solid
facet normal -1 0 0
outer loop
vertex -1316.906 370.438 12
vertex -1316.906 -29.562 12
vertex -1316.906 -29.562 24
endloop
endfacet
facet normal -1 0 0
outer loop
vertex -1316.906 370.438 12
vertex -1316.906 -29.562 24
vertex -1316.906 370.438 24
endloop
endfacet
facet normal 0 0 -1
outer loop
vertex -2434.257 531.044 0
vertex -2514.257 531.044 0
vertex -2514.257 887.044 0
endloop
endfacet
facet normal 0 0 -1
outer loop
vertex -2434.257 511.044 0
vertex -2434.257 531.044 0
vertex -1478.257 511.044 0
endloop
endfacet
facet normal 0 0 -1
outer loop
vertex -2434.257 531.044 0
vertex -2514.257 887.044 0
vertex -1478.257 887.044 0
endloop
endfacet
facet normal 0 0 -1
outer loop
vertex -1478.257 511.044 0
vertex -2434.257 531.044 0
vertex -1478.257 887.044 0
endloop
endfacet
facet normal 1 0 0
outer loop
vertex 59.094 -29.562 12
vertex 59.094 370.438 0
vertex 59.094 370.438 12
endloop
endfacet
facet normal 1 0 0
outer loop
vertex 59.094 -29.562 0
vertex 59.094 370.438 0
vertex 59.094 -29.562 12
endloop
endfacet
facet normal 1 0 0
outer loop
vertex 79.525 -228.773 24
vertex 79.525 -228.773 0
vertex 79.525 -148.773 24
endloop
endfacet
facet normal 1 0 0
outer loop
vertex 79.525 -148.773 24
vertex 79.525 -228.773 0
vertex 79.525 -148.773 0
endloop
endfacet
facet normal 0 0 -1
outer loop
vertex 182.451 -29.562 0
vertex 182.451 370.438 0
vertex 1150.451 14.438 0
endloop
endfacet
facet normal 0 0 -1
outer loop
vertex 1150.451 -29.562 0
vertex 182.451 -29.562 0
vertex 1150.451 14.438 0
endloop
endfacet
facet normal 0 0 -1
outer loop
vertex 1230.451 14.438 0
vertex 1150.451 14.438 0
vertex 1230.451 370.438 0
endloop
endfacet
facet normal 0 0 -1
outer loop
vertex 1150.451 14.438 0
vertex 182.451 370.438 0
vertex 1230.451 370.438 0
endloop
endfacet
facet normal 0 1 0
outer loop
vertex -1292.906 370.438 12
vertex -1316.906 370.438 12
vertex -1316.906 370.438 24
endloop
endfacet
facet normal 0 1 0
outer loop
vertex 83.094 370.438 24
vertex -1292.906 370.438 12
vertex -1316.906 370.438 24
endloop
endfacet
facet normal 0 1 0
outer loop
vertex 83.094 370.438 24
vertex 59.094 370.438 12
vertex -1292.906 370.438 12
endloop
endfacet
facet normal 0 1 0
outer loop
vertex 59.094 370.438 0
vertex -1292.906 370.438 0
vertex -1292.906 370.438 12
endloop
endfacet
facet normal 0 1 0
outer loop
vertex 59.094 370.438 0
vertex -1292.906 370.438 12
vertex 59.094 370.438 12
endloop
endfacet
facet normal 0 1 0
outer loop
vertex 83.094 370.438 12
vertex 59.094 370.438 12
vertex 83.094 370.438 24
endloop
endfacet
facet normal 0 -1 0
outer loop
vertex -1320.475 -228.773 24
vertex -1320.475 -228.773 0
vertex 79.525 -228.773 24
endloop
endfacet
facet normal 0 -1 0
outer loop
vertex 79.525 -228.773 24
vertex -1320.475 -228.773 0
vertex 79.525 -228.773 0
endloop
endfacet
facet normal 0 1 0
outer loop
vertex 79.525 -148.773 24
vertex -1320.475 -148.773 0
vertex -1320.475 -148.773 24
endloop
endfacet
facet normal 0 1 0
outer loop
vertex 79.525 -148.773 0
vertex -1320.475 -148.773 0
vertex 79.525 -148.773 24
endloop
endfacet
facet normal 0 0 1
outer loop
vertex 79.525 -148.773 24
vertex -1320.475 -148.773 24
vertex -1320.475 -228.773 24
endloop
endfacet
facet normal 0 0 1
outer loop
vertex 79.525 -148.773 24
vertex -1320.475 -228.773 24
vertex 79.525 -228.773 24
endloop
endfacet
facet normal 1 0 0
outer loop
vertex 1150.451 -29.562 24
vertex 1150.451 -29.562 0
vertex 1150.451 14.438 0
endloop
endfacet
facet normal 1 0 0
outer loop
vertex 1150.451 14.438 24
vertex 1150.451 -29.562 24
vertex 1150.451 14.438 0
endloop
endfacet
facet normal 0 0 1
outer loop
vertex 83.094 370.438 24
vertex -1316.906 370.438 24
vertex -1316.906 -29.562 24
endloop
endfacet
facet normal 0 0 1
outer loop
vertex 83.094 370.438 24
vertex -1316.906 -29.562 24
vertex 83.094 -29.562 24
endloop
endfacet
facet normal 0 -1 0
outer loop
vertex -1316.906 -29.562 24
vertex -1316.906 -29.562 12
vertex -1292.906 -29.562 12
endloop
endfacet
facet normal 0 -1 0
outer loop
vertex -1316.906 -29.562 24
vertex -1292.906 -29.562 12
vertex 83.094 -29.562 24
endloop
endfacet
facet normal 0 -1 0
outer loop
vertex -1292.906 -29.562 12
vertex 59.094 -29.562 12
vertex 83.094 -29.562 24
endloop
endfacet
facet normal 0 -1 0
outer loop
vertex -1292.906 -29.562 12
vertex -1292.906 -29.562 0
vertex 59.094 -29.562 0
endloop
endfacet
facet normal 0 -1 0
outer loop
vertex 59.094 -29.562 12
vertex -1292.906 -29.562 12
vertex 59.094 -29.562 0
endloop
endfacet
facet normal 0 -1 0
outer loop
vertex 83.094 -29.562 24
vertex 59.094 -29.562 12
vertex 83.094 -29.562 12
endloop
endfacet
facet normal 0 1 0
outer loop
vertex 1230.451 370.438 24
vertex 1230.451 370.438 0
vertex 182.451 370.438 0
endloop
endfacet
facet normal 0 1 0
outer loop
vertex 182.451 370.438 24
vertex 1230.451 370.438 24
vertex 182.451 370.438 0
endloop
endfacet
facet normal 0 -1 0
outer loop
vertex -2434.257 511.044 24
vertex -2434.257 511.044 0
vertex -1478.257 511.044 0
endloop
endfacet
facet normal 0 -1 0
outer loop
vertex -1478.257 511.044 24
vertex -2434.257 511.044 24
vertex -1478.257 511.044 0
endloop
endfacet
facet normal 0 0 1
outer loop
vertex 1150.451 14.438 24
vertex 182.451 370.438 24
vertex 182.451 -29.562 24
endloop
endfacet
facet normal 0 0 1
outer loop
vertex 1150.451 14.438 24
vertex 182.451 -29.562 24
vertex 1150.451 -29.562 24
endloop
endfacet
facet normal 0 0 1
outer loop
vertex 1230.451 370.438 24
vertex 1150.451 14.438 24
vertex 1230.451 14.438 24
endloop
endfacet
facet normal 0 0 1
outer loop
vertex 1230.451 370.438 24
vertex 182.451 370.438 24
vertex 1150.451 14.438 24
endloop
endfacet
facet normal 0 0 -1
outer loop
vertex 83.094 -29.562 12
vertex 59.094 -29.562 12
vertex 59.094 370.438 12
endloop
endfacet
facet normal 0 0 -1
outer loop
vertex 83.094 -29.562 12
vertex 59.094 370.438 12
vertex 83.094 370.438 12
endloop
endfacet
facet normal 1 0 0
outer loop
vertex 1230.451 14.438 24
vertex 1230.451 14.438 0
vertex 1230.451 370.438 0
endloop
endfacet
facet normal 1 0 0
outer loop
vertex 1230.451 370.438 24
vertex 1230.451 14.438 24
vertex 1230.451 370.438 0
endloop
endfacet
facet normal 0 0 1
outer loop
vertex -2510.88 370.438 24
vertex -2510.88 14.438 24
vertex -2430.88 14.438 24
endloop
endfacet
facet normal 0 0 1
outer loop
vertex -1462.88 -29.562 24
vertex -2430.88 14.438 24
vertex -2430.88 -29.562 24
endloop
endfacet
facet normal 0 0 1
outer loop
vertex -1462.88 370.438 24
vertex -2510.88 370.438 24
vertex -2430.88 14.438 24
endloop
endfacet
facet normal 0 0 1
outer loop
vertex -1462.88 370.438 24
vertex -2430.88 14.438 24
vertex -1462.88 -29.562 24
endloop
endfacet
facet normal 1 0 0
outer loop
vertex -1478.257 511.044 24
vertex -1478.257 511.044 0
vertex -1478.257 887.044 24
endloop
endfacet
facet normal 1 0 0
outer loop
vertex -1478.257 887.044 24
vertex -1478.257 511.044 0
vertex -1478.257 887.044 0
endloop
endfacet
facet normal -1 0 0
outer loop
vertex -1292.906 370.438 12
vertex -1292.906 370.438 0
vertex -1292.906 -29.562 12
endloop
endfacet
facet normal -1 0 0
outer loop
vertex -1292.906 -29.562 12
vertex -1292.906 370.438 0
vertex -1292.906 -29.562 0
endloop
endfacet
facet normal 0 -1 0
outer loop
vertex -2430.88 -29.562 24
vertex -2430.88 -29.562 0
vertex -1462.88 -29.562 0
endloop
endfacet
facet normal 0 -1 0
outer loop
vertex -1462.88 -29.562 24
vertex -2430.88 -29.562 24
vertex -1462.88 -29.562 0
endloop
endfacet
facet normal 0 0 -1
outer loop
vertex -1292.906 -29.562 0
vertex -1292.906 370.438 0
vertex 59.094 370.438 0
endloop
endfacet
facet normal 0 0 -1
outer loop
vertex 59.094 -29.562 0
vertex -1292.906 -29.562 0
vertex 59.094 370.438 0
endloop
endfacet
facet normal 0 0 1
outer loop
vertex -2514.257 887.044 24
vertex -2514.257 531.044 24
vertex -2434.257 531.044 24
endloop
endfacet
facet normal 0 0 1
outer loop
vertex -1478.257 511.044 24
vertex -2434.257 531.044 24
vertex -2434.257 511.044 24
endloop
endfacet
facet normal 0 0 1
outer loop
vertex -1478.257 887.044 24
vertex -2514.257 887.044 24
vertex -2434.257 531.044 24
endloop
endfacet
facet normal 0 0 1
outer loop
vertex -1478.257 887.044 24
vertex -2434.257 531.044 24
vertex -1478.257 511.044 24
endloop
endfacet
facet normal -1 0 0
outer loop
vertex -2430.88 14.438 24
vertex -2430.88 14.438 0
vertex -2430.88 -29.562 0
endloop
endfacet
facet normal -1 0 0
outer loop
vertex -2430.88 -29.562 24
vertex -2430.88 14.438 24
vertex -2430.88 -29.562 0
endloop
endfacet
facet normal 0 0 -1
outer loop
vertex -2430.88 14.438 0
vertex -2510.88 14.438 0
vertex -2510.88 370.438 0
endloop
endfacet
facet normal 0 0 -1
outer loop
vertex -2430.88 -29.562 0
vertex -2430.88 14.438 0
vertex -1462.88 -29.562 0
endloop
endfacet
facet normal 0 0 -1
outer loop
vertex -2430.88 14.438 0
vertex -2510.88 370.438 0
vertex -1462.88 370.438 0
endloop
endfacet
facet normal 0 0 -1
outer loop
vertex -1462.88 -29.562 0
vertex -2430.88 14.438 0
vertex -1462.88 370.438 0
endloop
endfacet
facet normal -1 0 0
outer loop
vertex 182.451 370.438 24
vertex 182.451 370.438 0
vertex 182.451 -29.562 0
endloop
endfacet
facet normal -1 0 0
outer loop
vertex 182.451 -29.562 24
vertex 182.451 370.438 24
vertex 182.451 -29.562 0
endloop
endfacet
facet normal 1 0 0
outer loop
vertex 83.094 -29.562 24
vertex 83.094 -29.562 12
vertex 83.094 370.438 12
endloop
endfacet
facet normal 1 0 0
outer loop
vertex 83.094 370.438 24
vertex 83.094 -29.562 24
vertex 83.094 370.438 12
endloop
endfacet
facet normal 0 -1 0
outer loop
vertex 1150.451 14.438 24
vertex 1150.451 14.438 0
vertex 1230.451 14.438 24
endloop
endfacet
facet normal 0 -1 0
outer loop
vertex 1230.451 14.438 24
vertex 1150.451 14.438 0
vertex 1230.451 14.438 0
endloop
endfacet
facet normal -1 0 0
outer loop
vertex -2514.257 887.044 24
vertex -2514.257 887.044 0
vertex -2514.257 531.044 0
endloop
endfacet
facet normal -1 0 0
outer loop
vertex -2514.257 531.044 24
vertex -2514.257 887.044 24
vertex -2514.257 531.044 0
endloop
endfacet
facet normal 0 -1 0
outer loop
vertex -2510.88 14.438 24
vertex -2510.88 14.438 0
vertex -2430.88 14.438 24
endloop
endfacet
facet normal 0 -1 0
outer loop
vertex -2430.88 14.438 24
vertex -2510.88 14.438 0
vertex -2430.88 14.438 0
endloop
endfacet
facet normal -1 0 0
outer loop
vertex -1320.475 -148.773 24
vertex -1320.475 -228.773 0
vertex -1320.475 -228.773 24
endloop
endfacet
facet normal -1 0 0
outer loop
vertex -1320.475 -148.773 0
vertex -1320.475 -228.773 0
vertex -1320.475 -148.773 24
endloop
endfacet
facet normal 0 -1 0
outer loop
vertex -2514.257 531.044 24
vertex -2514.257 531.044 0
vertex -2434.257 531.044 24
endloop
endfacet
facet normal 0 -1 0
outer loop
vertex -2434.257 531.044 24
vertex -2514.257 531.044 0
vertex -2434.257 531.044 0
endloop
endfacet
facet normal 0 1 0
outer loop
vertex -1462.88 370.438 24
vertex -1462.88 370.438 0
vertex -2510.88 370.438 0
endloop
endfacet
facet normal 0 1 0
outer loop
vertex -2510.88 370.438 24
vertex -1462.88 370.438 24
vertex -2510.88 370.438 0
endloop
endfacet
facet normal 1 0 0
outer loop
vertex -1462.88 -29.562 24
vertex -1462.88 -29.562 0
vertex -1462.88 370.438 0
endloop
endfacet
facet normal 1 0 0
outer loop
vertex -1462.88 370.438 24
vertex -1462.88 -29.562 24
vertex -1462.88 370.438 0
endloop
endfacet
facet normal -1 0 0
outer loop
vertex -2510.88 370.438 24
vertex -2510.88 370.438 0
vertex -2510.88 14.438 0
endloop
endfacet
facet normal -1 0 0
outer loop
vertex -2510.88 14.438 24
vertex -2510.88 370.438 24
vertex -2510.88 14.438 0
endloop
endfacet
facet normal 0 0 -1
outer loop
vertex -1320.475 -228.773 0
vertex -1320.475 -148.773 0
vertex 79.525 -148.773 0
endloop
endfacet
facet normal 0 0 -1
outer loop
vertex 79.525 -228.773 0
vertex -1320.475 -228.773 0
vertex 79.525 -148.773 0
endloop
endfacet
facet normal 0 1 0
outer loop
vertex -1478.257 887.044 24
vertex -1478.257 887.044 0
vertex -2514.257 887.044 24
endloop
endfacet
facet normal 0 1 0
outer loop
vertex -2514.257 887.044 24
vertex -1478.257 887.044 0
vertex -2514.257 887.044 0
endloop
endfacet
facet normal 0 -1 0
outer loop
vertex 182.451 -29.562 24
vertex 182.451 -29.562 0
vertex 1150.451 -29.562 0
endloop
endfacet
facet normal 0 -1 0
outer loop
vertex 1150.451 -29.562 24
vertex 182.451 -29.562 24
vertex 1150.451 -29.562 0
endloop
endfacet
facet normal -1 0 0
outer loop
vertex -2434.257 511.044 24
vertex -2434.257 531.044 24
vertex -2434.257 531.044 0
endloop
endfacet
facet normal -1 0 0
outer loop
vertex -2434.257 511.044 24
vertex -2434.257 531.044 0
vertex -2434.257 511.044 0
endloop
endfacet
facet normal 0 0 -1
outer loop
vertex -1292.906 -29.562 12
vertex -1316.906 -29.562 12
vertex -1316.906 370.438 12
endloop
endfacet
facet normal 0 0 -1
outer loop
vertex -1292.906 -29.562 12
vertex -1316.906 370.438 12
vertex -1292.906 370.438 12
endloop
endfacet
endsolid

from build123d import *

# Parameters (mm, degrees)
F1_W      = 1400
F1_H      = 400
F2_DEPTH  = 24
F3_W      = 24
F3_H      = 400
F4_DEPTH  = 12
F6_DEPTH  = 24
F8_DEPTH  = 24
F10_DEPTH = 24
F11_W     = 1400
F11_H     = 80
F12_DEPTH = 24


with BuildPart() as f2:
    # F1 (on Top) → F2 (new body)
    with BuildSketch(Plane.XY):
        with Locations((-616.905708611, 170.4380482435)):
            Rectangle(F1_W, F1_H)
    extrude(amount=F2_DEPTH)

    # F3 (on face) → F4 (cut)
    with BuildSketch(Plane(origin=(0, 0, 0), x_dir=(1, 0, 0), z_dir=(0, 0, -1))):
        with Locations((-1304.905708611, -170.4380482435)):
            Rectangle(F3_W, F3_H)
        with Locations((71.094291389, -170.4380482435)):
            Rectangle(F3_W, F3_H)
    extrude(amount=-F4_DEPTH, mode=Mode.SUBTRACT)


with BuildPart() as f6:
    # F5 (on Top) → F6 (new body)
    with BuildSketch(Plane.XY):
        Polygon((1230.4513595249, 370.4380482435), (182.4513595249, 370.4380482435), (182.4513595249, -29.5619517565), (1150.4513595249, -29.5619517565), (1150.4513595249, 14.4380482435), (1230.4513595249, 14.4380482435), align=None)
    extrude(amount=F6_DEPTH)


with BuildPart() as f8:
    # F7 (on Top) → F8 (new body)
    with BuildSketch(Plane.XY):
        Polygon((-1462.8804537941, -29.5619517565), (-1462.8804537941, 370.4380482435), (-2510.8804537941, 370.4380482435), (-2510.8804537941, 14.4380482435), (-2430.8804537941, 14.4380482435), (-2430.8804537941, -29.5619517565), align=None)
    extrude(amount=F8_DEPTH)


with BuildPart() as f10:
    # F9 (on Top) → F10 (new body)
    with BuildSketch(Plane.XY):
        Polygon((-2434.2570304871, 511.0437083244), (-1478.2570304871, 511.0437083244), (-1478.2570304871, 887.0437083244), (-2514.2570304871, 887.0437083244), (-2514.2570304871, 531.0437083244), (-2434.2570304871, 531.0437083244), align=None)
    extrude(amount=F10_DEPTH)


with BuildPart() as f12:
    # F11 (on Top) → F12 (new body)
    with BuildSketch(Plane.XY):
        with Locations((-620.4753935337, -188.7731319666)):
            Rectangle(F11_W, F11_H)
    extrude(amount=F12_DEPTH)


solid = Compound([f2.part, f6.part, f8.part, f10.part, f12.part])
